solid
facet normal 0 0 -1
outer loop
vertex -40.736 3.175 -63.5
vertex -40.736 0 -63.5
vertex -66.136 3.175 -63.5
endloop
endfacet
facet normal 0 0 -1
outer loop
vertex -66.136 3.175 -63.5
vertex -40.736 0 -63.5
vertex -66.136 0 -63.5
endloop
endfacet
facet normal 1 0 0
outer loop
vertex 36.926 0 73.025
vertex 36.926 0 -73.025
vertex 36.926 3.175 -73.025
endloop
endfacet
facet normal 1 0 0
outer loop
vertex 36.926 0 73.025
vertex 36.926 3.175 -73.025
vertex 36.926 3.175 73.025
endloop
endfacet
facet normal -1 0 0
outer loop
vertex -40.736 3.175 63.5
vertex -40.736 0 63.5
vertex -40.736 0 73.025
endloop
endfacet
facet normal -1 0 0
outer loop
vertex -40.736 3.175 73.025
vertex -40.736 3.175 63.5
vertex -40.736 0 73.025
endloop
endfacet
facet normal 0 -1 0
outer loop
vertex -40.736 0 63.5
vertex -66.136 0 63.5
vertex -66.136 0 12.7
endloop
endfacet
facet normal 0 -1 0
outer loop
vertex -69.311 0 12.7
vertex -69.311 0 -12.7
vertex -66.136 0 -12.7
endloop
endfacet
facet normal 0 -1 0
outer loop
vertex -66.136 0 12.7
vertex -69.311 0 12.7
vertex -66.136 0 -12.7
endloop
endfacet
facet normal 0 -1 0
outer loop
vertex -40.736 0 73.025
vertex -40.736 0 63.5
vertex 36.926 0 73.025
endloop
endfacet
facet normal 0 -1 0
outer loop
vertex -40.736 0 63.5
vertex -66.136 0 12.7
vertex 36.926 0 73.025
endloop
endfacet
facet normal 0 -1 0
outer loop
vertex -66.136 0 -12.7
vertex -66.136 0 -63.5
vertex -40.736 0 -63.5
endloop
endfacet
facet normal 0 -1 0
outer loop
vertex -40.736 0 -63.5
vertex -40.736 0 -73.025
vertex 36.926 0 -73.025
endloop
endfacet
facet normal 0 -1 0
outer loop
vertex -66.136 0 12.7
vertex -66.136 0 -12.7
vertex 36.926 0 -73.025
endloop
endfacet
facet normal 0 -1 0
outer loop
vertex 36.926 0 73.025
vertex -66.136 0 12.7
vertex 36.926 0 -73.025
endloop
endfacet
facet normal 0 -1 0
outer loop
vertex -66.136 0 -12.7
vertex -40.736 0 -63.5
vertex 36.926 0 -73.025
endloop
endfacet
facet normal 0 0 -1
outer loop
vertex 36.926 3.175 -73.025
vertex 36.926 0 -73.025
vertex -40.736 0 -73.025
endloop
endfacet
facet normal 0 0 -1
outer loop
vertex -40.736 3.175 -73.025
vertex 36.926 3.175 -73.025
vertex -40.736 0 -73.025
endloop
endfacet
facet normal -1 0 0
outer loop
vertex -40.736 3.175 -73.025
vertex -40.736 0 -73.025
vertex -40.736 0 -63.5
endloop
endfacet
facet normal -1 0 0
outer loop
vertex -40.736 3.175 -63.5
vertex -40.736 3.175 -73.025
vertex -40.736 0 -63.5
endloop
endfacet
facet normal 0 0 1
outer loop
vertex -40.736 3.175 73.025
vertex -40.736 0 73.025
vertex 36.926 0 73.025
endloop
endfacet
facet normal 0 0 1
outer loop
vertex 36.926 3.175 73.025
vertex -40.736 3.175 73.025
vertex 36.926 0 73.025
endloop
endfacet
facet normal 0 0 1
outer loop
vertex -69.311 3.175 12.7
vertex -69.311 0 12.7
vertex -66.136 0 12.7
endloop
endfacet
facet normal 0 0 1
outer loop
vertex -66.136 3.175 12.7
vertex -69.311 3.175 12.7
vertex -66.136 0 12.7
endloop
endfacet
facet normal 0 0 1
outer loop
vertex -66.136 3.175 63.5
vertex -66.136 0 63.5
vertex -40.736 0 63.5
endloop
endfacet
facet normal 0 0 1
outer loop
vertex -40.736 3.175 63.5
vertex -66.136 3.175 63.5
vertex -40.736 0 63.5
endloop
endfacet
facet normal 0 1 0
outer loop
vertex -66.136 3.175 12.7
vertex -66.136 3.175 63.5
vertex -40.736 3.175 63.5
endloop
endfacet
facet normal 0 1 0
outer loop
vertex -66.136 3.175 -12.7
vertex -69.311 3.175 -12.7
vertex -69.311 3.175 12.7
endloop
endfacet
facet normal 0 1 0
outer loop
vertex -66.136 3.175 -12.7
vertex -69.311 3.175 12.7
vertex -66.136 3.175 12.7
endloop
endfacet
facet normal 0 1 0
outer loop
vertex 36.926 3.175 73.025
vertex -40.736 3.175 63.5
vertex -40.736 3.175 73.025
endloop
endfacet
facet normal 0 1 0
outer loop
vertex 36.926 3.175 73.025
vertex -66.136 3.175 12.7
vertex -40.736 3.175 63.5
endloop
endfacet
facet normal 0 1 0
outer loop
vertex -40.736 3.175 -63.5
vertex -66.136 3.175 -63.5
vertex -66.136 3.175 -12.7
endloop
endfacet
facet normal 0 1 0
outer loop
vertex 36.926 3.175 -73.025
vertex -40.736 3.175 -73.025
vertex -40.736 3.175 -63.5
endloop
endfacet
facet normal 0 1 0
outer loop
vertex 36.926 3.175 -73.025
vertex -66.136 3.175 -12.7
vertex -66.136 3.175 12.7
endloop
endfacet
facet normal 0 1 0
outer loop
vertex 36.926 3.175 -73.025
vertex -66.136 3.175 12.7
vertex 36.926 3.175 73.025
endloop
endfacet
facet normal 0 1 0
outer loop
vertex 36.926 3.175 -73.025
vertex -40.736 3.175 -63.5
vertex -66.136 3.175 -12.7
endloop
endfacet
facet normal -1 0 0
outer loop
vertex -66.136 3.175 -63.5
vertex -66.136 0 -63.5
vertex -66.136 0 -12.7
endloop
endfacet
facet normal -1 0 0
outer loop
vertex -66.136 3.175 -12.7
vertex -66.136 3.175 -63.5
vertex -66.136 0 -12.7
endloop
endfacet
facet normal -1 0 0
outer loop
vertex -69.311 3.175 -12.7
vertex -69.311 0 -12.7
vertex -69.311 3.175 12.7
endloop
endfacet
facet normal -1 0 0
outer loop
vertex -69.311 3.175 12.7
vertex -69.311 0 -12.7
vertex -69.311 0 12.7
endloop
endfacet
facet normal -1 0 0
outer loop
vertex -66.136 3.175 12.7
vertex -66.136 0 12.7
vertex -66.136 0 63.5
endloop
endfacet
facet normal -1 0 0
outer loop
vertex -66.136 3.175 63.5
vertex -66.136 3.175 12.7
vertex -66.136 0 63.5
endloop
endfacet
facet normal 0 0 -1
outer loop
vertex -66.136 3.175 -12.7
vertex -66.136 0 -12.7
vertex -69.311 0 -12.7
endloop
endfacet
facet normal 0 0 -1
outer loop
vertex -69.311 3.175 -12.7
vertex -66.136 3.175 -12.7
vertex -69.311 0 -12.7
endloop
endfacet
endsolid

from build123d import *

# Parameters (mm, degrees)
BOSS_EXTRUDE1_DEPTH = 3.175
SKETCH2_W           = 29.21
SKETCH2_H           = 146.05
CUT_EXTRUDE1_DEPTH  = 101.731234192


with BuildPart() as part:
    # Sketch1 → Boss-Extrude1 (new body)
    with BuildSketch(Plane(origin=(0, 0, 0), x_dir=(1, 0, 0), z_dir=(0, 1, 0))):
        Polygon((-40.736256602, -73.025), (59.786256602, -73.025), (59.786256602, -63.5), (66.136256602, -63.5), (66.136256602, 63.5), (59.786256602, 63.5), (59.786256602, 73.025), (-40.736256602, 73.025), (-40.736256602, 63.5), (-66.136256602, 63.5), (-66.136256602, 12.7), (-69.311256602, 12.7), (-69.311256602, -12.7), (-66.136256602, -12.7), (-66.136256602, -63.5), (-40.736256602, -63.5), align=None)
    extrude(amount=BOSS_EXTRUDE1_DEPTH)

    # Sketch2 → Cut-Extrude1 (cut, through all)
    with BuildSketch(Plane.XZ):
        with Locations((51.531256602, 0)):
            Rectangle(SKETCH2_W, SKETCH2_H)
    extrude(amount=-CUT_EXTRUDE1_DEPTH, mode=Mode.SUBTRACT)


solid = part.part
